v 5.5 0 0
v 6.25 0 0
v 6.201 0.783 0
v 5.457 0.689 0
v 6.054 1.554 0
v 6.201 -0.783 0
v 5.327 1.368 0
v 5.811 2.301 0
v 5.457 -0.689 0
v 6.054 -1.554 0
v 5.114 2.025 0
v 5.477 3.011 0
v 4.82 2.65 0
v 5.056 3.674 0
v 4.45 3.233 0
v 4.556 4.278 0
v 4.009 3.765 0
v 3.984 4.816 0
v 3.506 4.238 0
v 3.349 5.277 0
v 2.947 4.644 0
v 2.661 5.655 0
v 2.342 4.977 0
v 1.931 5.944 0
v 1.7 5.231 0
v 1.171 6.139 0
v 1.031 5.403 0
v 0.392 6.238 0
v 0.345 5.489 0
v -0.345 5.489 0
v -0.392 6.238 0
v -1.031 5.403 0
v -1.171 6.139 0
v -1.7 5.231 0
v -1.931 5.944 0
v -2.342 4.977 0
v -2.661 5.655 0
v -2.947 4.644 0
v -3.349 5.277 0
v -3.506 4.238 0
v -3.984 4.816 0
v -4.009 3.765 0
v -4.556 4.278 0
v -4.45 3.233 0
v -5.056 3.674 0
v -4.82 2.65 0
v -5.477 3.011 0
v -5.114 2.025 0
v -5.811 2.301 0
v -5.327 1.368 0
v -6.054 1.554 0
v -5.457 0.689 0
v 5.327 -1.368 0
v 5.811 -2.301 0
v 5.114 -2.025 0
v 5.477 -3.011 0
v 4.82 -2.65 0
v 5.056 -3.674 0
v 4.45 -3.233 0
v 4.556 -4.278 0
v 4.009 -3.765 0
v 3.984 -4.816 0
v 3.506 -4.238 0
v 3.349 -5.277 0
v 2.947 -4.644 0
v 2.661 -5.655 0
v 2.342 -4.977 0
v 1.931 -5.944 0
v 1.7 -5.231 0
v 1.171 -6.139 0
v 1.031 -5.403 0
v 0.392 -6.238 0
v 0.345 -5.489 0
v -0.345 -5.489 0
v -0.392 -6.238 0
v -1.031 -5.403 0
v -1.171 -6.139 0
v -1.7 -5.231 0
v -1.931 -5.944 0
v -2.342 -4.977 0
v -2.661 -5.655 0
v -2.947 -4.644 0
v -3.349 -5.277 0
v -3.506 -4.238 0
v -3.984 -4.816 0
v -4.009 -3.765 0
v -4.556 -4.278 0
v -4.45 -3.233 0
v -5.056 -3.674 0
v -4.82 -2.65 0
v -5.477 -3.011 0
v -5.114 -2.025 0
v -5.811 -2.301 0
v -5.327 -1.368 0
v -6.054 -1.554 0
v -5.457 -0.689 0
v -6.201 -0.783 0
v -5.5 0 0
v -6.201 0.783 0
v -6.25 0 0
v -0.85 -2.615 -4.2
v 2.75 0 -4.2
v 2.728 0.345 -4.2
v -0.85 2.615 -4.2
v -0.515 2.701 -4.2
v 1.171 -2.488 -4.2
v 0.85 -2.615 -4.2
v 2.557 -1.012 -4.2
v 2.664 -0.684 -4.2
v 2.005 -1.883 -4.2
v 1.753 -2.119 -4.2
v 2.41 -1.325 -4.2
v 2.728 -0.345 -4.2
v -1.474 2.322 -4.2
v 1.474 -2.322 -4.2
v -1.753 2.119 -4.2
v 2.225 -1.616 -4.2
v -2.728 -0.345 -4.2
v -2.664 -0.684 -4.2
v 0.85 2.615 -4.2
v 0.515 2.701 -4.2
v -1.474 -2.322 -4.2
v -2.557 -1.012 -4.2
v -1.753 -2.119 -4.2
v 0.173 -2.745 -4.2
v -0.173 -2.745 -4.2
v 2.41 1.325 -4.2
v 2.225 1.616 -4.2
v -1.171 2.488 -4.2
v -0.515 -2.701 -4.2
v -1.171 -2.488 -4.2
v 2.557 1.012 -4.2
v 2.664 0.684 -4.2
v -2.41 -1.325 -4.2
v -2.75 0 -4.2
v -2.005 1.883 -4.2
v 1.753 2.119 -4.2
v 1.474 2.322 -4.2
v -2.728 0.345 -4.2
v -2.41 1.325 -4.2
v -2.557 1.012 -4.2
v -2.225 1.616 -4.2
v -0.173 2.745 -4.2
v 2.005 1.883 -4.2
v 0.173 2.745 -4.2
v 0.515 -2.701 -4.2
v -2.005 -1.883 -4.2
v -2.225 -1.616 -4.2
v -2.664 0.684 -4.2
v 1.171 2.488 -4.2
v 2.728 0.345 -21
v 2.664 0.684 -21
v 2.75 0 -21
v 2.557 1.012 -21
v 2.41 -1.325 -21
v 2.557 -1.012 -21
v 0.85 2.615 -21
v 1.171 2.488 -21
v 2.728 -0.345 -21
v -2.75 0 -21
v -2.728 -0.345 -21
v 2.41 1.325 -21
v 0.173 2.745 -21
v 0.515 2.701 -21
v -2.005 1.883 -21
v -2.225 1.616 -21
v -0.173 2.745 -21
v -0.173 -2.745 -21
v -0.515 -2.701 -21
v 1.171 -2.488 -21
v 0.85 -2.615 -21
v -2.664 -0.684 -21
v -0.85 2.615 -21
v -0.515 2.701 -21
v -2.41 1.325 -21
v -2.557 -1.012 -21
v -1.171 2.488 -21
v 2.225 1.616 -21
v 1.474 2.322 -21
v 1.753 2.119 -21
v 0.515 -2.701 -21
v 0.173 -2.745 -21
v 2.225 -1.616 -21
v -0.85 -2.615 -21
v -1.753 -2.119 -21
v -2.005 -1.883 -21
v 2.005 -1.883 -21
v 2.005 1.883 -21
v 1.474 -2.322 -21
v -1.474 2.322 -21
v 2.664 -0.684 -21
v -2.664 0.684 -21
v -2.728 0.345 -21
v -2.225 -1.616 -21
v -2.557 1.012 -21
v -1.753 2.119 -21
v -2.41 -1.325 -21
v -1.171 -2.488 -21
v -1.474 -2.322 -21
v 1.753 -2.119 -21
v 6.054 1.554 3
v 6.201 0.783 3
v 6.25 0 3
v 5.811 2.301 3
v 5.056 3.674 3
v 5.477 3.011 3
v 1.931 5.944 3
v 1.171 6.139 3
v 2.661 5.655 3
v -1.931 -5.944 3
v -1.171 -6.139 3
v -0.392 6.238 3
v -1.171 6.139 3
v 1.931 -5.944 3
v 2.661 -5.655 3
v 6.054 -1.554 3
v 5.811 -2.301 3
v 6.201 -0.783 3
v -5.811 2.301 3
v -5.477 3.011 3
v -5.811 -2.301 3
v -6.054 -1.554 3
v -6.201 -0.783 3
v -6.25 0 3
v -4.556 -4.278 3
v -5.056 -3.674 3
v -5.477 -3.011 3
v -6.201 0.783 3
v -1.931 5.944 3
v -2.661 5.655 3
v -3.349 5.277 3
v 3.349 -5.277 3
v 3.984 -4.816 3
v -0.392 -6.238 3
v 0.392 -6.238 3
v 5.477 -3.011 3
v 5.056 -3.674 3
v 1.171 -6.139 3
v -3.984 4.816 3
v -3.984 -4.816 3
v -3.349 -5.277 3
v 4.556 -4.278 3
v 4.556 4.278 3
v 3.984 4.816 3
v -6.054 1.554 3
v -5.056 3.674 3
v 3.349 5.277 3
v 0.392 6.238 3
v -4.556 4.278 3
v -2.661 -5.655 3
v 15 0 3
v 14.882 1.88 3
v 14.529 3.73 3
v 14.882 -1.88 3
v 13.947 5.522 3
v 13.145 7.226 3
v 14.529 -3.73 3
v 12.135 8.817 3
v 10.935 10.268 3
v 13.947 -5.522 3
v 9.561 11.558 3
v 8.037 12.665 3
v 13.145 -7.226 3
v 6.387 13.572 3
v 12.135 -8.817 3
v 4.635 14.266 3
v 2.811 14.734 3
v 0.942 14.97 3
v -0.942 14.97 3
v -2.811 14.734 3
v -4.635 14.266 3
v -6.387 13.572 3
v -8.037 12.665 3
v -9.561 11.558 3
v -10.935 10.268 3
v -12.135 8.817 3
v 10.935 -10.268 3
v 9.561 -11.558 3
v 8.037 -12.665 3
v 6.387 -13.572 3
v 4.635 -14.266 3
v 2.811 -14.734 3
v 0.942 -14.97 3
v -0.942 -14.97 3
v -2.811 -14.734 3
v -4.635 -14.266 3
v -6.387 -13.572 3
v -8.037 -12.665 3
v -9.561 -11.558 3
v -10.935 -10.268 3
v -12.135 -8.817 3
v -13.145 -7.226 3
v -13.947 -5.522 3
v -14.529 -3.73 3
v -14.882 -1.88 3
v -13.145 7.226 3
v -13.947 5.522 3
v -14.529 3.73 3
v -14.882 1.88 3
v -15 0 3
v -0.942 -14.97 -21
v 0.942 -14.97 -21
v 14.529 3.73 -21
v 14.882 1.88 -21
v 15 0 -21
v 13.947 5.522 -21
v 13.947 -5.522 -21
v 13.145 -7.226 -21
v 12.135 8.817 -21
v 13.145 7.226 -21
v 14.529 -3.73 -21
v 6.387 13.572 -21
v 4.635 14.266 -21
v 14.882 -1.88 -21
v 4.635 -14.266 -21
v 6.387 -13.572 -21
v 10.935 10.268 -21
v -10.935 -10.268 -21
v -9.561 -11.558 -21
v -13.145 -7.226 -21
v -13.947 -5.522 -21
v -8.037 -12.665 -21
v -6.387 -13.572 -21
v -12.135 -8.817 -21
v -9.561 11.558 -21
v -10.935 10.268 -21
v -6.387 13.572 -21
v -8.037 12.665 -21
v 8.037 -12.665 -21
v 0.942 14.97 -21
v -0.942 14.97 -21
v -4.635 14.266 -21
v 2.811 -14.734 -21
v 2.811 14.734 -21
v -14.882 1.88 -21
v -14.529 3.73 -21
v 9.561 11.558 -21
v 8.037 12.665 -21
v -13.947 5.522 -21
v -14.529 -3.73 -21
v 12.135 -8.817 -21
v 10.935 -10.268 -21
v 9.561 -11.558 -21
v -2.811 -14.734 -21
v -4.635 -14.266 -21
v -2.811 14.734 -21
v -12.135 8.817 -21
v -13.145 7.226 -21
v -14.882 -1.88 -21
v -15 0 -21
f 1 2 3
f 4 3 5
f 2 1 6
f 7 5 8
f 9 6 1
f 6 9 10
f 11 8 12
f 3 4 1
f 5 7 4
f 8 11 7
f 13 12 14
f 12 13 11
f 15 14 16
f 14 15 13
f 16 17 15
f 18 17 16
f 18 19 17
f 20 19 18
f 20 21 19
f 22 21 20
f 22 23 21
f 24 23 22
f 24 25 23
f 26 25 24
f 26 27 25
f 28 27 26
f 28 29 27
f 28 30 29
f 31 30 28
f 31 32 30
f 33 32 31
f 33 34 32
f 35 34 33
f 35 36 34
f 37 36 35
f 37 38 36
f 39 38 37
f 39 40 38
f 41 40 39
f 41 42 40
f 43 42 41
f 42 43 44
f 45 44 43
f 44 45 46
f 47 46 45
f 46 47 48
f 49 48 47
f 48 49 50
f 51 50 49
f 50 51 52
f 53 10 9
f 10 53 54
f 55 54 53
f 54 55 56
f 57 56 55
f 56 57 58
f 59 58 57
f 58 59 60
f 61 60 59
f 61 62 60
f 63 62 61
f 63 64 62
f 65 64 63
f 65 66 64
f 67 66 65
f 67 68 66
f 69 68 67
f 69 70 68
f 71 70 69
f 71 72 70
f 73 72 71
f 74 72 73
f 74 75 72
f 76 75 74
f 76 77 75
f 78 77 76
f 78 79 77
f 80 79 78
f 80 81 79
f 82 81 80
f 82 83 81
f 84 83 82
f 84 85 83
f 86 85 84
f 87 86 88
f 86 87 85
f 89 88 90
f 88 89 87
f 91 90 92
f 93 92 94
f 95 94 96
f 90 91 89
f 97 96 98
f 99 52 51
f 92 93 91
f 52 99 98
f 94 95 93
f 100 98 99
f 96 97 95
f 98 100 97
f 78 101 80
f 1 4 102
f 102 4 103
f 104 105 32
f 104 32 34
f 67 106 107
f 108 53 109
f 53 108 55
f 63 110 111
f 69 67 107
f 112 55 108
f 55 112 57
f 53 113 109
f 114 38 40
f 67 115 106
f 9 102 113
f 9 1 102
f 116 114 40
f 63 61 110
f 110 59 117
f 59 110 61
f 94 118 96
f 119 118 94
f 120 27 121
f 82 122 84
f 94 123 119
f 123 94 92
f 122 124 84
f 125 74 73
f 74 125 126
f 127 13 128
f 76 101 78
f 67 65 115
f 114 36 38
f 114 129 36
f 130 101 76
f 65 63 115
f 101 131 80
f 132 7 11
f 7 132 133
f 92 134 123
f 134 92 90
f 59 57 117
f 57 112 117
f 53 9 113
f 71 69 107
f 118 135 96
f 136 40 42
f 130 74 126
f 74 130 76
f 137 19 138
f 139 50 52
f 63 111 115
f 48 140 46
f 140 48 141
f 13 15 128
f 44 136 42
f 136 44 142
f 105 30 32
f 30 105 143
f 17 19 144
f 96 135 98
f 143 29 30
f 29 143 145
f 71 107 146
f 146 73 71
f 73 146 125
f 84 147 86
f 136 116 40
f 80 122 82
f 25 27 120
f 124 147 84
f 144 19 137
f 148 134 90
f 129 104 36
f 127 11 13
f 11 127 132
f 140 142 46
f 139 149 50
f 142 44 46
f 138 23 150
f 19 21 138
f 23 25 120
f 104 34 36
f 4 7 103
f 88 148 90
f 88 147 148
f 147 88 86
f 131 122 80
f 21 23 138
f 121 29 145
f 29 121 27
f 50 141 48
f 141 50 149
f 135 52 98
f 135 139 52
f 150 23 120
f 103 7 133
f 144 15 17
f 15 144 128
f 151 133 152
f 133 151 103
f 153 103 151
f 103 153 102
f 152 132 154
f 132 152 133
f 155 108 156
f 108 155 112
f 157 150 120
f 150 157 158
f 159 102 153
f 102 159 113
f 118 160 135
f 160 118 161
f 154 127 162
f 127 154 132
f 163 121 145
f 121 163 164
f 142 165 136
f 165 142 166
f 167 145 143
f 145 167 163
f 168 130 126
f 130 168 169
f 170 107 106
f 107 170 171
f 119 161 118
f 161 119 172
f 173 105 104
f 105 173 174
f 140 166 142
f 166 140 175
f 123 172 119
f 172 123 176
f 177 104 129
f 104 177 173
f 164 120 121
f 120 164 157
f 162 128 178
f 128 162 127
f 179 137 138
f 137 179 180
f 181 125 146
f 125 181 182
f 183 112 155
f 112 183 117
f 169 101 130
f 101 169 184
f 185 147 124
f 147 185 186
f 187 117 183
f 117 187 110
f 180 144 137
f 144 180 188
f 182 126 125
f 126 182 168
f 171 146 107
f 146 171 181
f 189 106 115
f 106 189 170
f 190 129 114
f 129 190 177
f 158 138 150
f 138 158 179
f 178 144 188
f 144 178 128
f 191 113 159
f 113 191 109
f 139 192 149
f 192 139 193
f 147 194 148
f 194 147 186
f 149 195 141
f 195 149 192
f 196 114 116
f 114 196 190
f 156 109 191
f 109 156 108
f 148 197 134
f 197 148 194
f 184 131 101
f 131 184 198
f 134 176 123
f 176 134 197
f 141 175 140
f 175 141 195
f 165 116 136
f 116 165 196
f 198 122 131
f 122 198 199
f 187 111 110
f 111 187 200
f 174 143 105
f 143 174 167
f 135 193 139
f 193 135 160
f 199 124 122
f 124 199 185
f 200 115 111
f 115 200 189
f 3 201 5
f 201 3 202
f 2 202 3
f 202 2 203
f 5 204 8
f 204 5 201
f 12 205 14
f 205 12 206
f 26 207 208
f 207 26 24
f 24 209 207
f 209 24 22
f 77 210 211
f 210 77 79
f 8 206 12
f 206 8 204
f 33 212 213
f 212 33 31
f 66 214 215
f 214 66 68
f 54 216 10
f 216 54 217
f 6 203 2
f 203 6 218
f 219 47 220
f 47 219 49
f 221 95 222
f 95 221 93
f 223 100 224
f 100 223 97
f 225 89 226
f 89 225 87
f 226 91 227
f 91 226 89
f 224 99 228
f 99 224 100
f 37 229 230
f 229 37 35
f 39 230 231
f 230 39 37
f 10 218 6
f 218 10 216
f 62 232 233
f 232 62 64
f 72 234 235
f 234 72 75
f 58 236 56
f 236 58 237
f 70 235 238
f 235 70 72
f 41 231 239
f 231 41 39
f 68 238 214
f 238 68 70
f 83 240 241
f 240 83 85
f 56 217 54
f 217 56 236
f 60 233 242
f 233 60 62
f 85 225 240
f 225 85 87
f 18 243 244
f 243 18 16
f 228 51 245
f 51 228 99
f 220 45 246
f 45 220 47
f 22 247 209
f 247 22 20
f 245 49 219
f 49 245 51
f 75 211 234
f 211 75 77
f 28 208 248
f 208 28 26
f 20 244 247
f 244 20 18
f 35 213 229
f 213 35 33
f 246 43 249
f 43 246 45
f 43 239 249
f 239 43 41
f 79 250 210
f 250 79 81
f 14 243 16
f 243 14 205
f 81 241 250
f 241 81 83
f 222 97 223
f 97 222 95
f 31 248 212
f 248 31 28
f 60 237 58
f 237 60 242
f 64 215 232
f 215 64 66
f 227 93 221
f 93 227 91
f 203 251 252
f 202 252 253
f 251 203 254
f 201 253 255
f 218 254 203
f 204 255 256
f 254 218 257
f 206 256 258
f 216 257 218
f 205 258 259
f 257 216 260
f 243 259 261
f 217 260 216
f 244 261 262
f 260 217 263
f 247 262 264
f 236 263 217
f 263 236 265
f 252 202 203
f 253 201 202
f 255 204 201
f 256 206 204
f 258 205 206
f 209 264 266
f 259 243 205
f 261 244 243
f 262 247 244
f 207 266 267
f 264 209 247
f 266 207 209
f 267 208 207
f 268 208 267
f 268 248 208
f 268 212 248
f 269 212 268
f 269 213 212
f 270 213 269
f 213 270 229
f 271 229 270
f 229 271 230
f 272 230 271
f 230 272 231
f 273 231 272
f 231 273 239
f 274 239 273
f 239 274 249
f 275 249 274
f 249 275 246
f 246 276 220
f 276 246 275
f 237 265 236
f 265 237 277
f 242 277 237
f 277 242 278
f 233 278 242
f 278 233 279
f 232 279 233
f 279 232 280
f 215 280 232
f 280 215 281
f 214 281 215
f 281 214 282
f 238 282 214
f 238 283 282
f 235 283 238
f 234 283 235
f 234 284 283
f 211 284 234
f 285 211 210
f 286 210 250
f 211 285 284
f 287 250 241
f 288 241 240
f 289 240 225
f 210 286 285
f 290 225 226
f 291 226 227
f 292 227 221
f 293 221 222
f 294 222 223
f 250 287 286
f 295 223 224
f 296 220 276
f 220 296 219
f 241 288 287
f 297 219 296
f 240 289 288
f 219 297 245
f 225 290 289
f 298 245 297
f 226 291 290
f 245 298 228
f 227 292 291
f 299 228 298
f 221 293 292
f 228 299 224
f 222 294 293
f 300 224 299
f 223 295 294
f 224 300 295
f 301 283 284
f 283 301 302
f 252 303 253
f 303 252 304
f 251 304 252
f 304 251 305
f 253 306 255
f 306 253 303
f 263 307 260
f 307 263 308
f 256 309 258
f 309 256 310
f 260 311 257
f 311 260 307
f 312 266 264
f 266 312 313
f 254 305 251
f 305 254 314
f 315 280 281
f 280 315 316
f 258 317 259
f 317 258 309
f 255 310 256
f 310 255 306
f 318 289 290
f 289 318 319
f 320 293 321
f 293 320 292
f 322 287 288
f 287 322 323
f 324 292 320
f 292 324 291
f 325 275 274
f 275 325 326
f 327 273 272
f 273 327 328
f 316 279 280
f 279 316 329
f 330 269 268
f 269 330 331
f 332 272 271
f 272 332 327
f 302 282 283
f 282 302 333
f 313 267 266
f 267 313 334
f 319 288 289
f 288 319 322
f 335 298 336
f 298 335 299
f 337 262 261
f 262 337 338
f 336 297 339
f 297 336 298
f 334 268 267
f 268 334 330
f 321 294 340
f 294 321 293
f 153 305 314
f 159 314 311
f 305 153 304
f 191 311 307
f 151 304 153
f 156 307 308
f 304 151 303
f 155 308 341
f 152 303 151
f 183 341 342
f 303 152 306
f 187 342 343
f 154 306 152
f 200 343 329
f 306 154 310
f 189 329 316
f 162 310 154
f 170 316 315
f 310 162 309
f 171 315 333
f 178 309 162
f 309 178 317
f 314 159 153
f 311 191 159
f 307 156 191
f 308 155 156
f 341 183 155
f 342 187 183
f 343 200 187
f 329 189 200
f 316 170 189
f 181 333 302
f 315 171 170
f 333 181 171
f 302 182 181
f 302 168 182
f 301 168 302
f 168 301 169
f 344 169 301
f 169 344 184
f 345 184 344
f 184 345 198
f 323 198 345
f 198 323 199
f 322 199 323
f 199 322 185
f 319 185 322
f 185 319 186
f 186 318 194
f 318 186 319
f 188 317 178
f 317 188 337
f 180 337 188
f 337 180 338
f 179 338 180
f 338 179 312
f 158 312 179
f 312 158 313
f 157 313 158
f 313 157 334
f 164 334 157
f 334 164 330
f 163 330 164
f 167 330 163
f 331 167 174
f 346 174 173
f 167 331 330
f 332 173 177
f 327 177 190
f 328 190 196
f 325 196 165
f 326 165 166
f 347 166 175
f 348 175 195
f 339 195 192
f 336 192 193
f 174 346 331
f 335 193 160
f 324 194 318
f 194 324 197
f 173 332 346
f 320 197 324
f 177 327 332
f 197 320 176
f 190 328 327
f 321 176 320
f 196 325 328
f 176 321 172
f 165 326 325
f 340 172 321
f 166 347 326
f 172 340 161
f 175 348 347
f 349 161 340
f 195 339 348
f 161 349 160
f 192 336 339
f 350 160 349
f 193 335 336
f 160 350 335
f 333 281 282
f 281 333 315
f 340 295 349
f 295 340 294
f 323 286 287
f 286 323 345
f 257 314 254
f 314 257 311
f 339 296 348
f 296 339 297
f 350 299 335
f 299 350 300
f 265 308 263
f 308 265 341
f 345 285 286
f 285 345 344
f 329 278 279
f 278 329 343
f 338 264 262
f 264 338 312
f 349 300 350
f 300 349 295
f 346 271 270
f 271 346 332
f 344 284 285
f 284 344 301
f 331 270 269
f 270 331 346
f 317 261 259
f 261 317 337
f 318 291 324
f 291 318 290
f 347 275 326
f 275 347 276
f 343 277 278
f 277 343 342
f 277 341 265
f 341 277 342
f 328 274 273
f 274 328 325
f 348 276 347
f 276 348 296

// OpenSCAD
$fn = 50;


difference() {
	union() {
		translate(v = [0, 0, -21.0000000000]) {
			cylinder(h = 24, r = 15.0000000000);
		}
	}
	union() {
		translate(v = [0, 0, 0]) {
			rotate(a = [0, 0, 0]) {
				difference() {
					union() {
						translate(v = [0, 0, -24.0000000000]) {
							cylinder(h = 24, r = 2.2500000000);
						}
						translate(v = [0, 0, -4.2000000000]) {
							cylinder(h = 4.2000000000, r1 = 2.7500000000, r2 = 5.5000000000);
						}
						translate(v = [0, 0, -24.0000000000]) {
							cylinder(h = 24, r = 2.7500000000);
						}
						translate(v = [0, 0, -24.0000000000]) {
							cylinder(h = 24, r = 2.2500000000);
						}
					}
					union();
				}
			}
		}
		#cylinder(h = 3, r = 6.2500000000);
	}
}
